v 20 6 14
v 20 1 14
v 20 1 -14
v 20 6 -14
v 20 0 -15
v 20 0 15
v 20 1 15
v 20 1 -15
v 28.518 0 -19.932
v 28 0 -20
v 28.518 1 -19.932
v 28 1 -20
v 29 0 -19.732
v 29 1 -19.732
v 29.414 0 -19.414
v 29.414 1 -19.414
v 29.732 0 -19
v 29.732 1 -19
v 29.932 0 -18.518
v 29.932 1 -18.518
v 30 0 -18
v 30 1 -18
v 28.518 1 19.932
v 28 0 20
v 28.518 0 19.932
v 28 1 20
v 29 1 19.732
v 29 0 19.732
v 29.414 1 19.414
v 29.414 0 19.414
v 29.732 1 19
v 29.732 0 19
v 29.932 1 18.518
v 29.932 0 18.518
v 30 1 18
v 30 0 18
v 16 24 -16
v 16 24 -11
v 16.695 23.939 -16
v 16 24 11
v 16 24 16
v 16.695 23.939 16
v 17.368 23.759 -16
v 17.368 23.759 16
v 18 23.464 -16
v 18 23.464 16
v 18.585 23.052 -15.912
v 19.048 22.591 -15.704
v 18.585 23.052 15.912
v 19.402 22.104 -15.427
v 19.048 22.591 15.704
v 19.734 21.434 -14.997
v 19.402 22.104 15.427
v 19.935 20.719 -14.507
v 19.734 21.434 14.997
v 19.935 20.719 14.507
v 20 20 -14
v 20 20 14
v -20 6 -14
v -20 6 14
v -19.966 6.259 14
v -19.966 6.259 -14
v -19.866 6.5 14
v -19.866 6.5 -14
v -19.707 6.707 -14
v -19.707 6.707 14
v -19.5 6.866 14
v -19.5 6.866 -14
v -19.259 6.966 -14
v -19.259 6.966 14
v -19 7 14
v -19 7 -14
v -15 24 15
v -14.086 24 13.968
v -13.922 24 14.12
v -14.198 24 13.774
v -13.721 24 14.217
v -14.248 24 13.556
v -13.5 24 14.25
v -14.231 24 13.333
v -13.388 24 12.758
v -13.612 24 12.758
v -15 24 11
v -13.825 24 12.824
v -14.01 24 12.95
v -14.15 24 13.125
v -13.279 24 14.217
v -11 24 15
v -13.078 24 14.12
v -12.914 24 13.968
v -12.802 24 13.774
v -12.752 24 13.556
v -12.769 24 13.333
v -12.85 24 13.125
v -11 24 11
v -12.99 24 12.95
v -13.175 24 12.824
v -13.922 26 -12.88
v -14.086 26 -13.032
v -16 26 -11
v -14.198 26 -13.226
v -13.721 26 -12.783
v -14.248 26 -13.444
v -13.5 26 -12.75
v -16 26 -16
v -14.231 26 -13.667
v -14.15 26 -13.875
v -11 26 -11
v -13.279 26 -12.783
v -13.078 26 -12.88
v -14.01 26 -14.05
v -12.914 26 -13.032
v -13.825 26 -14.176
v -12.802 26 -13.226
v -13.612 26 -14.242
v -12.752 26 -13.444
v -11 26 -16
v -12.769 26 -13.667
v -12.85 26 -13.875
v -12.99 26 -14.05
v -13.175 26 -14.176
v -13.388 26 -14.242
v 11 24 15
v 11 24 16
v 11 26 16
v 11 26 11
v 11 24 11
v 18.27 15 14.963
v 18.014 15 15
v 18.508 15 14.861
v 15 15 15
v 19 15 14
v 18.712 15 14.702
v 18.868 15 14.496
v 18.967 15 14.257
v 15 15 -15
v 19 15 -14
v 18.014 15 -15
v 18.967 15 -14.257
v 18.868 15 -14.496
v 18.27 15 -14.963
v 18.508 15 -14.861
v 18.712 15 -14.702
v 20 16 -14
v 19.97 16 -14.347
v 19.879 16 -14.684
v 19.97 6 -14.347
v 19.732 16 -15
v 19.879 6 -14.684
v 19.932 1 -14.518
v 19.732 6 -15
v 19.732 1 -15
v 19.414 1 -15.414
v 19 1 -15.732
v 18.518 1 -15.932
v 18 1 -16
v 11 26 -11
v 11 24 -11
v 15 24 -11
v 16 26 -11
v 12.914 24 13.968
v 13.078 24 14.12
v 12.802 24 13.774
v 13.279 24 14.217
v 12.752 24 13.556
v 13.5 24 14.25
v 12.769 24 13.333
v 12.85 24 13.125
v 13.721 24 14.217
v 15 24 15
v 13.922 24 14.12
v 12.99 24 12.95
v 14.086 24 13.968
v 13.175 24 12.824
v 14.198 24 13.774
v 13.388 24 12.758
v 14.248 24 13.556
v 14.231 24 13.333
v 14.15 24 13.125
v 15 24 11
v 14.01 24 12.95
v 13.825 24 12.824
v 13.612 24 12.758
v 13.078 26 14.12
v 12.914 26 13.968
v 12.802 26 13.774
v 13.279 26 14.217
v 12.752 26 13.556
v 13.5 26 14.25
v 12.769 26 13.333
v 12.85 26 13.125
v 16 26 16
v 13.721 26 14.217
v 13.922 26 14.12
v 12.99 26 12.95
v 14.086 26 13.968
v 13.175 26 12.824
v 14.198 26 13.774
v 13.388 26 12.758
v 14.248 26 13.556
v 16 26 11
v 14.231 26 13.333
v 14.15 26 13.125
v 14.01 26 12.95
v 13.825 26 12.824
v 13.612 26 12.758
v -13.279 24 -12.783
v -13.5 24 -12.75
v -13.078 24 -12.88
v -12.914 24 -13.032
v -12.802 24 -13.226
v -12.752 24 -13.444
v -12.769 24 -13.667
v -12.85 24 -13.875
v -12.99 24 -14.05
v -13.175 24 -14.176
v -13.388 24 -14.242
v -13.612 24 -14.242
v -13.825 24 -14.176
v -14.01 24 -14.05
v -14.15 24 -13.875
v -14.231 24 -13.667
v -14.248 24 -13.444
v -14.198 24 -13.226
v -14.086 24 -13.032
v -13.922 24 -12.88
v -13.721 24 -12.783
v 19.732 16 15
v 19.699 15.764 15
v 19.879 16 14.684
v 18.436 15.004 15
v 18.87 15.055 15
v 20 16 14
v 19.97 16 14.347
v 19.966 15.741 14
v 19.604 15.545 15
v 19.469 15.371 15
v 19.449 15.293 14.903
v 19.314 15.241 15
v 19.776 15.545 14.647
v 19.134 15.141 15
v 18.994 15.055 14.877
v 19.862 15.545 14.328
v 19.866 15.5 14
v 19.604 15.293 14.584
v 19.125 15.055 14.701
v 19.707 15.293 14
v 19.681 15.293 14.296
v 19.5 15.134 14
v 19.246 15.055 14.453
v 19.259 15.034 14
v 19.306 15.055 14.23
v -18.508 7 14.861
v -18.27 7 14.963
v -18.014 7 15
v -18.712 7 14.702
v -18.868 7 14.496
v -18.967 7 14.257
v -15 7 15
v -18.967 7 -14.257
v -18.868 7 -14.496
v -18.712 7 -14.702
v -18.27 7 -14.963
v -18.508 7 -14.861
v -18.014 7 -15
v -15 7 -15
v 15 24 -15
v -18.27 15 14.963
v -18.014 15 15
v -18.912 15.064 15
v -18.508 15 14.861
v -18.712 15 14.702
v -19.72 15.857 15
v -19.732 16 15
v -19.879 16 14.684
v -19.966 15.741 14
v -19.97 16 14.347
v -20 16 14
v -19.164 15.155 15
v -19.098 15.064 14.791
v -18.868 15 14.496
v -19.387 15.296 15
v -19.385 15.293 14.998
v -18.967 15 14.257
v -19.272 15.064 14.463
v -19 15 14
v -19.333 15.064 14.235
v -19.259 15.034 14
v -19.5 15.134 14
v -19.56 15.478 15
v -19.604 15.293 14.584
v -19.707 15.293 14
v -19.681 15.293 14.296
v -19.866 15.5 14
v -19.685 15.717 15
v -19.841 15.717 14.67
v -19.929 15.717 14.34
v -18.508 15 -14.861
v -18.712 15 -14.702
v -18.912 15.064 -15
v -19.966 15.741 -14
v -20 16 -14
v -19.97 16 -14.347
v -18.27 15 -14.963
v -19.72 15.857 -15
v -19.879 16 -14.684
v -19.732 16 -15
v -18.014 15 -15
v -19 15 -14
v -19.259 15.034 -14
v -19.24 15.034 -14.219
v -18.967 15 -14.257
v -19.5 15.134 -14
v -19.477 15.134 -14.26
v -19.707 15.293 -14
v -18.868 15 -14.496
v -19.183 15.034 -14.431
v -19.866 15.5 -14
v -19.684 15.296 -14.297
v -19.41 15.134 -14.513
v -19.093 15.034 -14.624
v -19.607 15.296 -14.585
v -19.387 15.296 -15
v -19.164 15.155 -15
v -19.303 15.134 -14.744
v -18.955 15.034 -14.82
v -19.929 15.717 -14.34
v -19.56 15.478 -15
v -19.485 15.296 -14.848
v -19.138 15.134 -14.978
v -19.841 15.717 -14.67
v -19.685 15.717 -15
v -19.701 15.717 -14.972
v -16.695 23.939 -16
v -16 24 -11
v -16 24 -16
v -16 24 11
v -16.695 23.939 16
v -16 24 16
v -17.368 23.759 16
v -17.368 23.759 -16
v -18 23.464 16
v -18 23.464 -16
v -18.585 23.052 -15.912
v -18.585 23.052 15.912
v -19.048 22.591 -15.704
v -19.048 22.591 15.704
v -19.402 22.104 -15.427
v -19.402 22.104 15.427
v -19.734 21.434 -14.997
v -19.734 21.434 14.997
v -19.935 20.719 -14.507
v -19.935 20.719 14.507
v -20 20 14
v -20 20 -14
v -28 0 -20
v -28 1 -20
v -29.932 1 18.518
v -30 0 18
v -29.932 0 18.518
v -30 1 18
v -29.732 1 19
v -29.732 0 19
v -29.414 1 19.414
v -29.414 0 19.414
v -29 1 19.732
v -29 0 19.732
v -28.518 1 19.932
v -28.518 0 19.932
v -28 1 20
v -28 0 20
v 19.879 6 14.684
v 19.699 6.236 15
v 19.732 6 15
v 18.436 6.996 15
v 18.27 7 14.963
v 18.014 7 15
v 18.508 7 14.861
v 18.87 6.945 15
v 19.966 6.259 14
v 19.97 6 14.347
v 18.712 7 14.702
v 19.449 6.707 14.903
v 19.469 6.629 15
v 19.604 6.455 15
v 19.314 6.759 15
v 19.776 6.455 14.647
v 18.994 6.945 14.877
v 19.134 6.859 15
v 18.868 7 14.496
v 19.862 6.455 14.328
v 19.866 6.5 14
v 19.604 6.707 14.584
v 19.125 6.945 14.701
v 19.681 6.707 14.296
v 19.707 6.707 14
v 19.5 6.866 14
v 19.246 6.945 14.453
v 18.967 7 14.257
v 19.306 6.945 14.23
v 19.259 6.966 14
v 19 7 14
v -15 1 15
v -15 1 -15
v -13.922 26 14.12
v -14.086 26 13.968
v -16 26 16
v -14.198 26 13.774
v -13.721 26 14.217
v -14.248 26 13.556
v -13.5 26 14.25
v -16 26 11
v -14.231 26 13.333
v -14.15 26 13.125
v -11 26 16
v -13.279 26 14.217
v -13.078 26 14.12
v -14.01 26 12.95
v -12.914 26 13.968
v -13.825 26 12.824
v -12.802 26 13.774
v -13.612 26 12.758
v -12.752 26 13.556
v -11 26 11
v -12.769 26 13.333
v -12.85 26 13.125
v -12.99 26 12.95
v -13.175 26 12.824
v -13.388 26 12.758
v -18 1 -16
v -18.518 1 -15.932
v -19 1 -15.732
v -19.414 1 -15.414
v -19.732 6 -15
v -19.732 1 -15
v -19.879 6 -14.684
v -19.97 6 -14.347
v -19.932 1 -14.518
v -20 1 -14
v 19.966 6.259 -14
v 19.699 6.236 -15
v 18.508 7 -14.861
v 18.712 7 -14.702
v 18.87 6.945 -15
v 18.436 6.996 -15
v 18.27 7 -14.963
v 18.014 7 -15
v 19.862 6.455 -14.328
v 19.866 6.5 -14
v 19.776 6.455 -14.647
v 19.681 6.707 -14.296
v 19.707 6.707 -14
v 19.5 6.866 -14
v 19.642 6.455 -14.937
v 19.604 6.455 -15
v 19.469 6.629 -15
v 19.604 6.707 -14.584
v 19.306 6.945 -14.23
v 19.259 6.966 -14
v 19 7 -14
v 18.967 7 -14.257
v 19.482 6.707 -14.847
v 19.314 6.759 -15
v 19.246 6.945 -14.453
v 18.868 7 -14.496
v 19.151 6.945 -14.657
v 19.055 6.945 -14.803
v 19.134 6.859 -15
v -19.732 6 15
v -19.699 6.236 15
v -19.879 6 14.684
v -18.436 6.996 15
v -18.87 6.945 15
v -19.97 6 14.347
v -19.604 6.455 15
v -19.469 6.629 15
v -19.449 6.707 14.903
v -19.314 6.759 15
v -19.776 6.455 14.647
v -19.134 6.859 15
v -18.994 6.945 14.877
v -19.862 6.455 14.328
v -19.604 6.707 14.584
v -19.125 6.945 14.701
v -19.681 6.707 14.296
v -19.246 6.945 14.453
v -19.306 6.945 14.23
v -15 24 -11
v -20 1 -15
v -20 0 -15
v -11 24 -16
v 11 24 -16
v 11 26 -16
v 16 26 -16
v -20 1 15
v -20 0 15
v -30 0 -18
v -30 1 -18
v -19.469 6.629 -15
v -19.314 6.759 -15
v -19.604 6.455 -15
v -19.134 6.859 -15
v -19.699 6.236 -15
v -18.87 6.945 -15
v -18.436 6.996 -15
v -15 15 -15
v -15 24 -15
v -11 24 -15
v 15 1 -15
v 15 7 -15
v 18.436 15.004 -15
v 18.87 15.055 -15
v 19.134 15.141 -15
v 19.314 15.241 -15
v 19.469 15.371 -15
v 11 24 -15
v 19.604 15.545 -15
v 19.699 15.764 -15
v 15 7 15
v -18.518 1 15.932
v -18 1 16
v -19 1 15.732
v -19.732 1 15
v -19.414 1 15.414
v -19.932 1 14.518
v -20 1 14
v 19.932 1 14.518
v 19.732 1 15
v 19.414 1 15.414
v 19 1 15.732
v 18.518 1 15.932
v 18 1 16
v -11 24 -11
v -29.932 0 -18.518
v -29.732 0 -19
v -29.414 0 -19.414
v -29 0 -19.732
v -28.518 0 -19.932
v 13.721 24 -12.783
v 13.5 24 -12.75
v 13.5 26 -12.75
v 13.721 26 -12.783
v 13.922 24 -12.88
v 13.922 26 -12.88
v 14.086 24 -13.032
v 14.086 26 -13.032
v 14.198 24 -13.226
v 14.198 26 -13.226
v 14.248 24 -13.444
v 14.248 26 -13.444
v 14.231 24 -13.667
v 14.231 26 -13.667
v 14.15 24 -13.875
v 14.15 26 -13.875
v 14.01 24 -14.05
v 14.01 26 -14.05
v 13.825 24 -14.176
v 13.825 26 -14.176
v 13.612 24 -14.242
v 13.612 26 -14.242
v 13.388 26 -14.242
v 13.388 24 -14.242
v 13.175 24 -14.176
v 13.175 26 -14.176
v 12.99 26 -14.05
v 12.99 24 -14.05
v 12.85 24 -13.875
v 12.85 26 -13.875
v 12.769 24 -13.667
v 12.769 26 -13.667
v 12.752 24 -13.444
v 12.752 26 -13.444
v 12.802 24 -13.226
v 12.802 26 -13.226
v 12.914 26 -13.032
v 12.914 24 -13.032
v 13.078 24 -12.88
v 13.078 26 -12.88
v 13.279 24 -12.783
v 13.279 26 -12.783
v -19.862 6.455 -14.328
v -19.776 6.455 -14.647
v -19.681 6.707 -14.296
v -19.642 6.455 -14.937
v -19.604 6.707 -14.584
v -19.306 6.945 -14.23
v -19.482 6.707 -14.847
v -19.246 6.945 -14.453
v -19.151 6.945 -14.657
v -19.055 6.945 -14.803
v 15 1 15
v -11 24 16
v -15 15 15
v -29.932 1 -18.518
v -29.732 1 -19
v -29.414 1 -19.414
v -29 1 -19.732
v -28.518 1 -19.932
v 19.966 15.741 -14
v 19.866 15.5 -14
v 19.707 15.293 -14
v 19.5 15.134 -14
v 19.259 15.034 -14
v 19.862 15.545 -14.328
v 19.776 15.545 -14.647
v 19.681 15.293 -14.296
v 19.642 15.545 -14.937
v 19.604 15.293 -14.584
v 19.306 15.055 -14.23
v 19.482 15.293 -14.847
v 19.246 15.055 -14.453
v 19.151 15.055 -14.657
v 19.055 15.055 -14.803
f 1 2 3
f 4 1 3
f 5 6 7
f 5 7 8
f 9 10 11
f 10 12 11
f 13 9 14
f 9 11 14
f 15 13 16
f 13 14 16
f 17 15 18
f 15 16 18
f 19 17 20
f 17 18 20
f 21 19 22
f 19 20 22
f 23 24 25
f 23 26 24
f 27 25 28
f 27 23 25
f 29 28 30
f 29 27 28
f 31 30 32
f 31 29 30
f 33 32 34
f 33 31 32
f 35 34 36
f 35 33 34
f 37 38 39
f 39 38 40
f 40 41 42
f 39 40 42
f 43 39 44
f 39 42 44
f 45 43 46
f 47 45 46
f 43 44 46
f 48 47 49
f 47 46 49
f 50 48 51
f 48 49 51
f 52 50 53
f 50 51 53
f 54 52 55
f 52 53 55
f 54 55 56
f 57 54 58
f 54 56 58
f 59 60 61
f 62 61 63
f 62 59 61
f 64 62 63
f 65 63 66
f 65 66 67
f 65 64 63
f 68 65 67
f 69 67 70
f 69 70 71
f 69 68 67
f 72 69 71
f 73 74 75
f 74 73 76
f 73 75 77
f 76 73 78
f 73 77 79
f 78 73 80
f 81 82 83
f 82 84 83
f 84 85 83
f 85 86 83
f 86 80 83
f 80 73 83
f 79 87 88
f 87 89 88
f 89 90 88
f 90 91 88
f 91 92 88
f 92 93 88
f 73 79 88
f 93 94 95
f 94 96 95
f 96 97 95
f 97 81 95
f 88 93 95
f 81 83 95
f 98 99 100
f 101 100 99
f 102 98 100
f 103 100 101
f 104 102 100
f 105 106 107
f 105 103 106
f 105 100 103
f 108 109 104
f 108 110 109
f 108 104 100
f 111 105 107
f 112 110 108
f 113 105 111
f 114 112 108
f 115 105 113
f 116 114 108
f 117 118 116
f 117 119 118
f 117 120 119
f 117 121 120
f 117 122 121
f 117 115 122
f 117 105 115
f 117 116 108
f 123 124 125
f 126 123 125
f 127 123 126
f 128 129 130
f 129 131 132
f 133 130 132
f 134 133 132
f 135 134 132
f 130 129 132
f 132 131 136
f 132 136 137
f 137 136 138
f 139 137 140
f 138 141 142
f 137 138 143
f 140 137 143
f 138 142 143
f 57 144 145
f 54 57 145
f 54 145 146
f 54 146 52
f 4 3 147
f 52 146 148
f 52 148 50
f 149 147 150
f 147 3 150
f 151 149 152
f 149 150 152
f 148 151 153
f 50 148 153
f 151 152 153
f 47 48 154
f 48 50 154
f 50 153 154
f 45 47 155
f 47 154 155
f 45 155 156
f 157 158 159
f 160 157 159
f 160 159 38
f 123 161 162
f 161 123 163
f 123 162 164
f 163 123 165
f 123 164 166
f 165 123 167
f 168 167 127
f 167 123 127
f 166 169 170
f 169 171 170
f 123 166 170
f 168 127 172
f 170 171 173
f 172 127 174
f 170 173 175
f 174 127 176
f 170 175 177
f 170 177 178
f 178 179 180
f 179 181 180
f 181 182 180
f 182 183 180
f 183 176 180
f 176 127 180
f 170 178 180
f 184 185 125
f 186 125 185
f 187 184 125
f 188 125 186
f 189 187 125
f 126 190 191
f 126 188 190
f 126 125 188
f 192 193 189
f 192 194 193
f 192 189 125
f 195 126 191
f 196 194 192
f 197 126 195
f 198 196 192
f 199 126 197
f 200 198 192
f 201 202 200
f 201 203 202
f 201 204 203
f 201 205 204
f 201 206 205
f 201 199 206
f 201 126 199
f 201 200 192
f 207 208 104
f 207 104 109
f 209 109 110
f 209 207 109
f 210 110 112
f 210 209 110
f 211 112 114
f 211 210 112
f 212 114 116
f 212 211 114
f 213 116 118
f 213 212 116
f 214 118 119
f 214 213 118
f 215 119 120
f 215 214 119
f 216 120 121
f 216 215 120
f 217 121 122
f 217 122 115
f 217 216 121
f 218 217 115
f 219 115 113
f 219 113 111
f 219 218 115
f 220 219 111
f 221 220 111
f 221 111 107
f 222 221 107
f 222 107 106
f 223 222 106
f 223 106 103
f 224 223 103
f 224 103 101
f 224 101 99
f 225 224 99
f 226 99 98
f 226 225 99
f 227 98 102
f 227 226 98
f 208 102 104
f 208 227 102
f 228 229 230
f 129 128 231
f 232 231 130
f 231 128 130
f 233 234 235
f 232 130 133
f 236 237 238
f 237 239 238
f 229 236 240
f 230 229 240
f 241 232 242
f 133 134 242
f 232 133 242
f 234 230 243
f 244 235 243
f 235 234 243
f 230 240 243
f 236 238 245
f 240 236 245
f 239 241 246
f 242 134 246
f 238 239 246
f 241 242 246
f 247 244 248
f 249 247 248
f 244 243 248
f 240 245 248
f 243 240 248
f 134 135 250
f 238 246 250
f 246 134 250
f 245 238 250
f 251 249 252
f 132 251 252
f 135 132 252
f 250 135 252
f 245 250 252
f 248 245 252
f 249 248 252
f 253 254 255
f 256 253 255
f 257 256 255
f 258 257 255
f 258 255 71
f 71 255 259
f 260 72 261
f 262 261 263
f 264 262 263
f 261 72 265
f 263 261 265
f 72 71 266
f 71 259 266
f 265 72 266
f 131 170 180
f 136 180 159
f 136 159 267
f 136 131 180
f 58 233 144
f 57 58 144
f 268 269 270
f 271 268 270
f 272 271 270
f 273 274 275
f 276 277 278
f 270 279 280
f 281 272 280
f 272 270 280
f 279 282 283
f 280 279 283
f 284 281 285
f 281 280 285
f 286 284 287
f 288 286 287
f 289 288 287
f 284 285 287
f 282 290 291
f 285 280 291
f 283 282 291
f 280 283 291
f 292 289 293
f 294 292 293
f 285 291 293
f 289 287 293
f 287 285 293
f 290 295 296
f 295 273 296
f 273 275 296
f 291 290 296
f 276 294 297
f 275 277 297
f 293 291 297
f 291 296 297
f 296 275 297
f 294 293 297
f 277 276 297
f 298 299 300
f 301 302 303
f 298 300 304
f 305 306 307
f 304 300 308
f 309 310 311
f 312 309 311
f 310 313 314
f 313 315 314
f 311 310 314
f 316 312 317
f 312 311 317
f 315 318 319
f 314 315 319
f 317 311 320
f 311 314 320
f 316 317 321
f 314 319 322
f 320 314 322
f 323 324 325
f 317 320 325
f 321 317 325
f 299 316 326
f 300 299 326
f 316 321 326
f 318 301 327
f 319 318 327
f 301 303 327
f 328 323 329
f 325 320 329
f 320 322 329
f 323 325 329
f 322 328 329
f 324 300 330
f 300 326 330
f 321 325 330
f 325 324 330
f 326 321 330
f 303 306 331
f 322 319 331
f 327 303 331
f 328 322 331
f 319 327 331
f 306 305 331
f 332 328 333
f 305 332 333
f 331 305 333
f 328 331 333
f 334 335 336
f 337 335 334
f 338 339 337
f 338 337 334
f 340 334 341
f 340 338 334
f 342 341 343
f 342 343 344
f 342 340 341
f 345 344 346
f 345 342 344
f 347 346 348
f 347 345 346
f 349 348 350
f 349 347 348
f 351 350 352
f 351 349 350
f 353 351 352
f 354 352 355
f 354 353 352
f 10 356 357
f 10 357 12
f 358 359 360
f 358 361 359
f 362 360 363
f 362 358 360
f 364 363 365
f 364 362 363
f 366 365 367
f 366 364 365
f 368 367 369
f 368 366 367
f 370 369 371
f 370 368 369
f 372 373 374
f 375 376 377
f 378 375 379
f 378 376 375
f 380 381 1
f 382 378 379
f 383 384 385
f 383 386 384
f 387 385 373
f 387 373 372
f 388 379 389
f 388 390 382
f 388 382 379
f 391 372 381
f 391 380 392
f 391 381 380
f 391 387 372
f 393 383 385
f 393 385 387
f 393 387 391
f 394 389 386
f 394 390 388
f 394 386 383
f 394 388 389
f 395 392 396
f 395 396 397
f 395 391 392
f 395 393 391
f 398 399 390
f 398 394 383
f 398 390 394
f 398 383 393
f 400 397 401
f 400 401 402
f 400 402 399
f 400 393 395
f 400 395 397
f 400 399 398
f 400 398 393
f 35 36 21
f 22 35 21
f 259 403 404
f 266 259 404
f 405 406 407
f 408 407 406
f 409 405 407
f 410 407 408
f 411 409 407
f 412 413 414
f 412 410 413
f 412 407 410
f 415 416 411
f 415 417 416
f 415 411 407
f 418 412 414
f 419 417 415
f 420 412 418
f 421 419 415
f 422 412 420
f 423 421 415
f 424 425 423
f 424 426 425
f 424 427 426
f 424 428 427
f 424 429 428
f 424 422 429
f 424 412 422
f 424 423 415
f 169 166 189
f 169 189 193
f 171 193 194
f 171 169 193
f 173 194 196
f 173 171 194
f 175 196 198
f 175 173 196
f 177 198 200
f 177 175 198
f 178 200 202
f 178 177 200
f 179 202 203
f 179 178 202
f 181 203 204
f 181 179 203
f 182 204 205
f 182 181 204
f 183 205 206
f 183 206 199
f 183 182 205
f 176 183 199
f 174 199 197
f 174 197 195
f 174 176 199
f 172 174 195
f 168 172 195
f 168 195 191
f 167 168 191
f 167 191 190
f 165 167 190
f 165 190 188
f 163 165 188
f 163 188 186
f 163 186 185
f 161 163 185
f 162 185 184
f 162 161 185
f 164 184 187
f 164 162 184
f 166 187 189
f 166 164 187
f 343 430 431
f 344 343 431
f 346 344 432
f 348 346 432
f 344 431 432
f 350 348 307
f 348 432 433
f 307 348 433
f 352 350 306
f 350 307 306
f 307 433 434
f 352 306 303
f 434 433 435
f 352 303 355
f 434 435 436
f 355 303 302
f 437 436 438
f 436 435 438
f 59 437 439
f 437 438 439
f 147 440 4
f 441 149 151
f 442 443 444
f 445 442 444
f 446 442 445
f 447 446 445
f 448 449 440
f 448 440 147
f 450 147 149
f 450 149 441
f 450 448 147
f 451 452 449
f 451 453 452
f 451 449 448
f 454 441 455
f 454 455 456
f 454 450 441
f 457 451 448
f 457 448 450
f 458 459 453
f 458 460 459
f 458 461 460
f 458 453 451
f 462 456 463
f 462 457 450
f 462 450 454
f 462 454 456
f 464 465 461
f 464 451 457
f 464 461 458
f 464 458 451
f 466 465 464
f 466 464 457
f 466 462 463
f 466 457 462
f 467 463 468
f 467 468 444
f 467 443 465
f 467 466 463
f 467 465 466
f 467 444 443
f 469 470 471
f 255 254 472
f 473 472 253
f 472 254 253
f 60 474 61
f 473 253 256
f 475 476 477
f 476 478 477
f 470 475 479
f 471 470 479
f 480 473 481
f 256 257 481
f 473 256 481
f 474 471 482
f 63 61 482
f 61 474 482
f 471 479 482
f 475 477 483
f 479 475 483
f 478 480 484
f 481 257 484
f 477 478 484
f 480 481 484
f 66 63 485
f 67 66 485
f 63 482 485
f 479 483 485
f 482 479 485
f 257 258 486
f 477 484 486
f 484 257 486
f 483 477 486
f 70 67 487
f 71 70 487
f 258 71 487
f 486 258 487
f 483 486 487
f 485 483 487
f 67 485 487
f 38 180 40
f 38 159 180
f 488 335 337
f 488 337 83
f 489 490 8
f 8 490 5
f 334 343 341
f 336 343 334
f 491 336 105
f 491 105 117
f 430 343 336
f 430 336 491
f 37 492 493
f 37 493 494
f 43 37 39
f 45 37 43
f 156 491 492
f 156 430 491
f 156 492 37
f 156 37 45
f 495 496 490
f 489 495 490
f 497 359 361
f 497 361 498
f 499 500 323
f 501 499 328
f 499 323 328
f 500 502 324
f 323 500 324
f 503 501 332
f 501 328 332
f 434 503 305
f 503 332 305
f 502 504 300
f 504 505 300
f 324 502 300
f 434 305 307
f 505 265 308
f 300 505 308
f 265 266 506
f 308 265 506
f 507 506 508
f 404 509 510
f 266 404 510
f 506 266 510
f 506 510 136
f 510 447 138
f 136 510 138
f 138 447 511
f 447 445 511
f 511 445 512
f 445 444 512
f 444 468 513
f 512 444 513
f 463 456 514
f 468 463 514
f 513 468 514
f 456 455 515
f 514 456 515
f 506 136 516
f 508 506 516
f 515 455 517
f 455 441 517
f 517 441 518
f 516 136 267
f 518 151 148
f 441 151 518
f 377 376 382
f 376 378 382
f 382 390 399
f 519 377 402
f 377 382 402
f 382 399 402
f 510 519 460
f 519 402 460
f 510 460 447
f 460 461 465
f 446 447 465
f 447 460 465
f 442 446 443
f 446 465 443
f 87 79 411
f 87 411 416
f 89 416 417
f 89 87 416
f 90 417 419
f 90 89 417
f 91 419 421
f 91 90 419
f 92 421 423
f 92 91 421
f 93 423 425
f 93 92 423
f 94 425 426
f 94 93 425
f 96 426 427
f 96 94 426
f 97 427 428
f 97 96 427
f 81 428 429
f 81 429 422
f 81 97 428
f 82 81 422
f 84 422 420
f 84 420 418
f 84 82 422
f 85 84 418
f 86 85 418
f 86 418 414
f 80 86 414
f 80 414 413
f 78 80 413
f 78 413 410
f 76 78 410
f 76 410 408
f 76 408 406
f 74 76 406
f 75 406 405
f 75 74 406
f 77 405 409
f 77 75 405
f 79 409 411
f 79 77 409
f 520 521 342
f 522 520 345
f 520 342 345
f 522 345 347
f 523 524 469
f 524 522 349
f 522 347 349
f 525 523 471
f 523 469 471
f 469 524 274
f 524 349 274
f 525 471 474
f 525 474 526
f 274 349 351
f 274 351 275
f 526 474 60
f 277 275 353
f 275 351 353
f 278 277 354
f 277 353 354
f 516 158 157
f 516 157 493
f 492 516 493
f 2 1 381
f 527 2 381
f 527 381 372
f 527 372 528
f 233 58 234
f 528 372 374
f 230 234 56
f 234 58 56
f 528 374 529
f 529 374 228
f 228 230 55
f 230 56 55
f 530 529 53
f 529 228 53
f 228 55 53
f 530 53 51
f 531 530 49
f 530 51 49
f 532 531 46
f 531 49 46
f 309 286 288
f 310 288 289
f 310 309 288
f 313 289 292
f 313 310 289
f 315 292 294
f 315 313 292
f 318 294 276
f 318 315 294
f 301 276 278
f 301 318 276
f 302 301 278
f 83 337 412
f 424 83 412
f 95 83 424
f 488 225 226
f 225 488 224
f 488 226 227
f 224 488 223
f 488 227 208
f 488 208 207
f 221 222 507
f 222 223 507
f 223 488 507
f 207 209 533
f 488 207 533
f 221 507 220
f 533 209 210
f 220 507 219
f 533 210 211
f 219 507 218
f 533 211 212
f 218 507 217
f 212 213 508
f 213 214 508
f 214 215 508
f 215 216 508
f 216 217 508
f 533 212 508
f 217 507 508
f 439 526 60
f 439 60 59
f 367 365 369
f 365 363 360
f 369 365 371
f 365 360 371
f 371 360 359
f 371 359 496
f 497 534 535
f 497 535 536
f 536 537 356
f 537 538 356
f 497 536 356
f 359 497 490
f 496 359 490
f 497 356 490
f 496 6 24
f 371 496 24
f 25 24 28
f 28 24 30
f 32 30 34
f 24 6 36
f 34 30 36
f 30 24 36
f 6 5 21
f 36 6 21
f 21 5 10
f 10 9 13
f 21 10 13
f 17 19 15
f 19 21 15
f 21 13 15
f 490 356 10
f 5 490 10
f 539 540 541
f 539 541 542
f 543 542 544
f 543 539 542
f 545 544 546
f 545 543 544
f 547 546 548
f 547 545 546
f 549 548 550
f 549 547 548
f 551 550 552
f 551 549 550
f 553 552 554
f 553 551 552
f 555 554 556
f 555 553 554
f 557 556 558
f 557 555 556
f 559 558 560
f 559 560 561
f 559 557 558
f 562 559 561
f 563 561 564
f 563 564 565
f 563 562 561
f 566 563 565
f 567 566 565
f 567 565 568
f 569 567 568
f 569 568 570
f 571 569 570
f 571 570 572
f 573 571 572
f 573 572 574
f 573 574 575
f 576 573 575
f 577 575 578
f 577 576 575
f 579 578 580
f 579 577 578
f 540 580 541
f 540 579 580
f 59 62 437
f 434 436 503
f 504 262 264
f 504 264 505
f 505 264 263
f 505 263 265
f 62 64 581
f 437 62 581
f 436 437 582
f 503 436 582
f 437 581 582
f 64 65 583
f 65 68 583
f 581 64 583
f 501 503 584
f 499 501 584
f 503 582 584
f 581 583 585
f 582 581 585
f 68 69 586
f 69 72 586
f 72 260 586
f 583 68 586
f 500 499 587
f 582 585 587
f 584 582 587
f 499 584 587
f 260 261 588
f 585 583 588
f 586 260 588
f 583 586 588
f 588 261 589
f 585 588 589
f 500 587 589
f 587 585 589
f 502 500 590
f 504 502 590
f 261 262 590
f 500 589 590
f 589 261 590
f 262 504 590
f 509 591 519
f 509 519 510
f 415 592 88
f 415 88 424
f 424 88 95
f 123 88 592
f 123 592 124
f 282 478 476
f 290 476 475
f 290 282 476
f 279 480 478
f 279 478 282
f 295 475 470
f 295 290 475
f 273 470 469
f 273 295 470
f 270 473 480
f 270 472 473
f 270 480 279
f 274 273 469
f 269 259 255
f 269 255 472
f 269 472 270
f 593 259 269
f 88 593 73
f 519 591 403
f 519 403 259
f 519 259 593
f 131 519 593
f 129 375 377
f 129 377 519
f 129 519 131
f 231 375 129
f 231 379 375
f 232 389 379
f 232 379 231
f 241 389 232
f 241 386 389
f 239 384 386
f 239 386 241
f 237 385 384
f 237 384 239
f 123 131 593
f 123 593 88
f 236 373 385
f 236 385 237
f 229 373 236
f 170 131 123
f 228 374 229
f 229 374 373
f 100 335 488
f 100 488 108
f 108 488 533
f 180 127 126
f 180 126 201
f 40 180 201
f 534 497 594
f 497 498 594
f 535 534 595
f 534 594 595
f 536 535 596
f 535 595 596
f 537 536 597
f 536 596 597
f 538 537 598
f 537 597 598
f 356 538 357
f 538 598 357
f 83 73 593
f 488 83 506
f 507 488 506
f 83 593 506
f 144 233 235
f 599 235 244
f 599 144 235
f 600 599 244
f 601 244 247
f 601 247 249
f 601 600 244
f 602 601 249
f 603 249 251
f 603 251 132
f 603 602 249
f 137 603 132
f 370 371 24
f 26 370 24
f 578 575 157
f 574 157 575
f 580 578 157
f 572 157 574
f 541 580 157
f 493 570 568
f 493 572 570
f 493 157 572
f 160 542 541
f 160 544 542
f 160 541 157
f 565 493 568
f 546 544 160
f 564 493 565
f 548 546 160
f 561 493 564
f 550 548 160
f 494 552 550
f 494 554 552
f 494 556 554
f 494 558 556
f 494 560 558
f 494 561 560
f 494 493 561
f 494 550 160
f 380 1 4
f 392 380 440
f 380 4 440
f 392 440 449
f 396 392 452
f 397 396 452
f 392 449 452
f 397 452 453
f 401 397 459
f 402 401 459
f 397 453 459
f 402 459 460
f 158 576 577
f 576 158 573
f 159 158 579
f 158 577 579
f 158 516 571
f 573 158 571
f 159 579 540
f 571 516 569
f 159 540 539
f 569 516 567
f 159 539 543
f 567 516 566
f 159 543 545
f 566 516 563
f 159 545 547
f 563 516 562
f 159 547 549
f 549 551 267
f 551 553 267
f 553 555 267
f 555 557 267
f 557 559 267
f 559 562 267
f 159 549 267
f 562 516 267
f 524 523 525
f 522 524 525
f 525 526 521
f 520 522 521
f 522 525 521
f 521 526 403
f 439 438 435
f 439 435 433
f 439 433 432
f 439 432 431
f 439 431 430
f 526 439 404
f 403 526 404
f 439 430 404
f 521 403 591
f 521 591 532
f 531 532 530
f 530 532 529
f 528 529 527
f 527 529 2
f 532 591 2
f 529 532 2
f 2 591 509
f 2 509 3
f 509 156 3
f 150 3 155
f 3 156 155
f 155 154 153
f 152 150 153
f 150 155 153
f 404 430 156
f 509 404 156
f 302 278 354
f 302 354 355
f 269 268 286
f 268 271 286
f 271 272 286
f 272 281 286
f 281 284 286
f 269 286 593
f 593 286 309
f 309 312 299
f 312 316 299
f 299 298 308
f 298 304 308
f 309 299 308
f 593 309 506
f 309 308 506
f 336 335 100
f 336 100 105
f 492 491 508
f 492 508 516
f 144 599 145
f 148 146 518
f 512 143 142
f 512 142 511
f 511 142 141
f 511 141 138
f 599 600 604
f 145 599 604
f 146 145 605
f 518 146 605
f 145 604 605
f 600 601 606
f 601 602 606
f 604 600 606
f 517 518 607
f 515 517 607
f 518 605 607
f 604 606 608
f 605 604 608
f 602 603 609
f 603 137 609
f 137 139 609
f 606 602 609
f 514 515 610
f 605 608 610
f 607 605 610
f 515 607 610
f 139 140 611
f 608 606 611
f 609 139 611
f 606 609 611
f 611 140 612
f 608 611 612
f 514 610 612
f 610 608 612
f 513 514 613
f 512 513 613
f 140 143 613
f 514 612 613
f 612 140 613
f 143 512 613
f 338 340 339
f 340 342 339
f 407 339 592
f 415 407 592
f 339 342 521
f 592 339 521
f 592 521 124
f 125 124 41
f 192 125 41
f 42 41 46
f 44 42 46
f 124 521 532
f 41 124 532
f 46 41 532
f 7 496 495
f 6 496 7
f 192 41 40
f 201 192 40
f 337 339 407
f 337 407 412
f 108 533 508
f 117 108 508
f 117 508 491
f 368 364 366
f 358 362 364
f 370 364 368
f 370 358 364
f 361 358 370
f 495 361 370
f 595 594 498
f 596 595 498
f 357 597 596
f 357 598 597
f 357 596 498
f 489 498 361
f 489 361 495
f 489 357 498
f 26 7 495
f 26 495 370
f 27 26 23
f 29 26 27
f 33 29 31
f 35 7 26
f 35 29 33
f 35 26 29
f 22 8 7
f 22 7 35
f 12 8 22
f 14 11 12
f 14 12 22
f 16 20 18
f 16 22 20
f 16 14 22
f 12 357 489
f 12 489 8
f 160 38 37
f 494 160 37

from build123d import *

# Parameters (mm, degrees)
SKETCH1_W           = 60
SKETCH1_H           = 40
SKETCH1_W_2         = 40
SKETCH1_H_2         = 30
BOSS_EXTRUDE1_DEPTH = 1
SKETCH2_W           = 30
SKETCH2_H           = 30
BOSS_EXTRUDE2_DEPTH = 14
SKETCH3_W           = 30
SKETCH3_H           = 8
CUT_EXTRUDE1_DEPTH  = 56.901699437
SKETCH4_W           = 40
SKETCH4_H           = 32
SKETCH4_W_2         = 30
SKETCH4_H_2         = 30
BOSS_EXTRUDE3_DEPTH = 9
FILLET1_R           = 2
FILLET2_R           = 2
FILLET4_R           = 1
CUT_EXTRUDE2_DEPTH  = 53.64978637
SKETCH7_W           = 5
SKETCH7_H           = 5
SKETCH7_R           = 0.75
BOSS_EXTRUDE5_DEPTH = 2


# Some blends are built 0.0001 mm under size
with BuildPart() as part:
    # Sketch1 → Boss-Extrude1 (new body)
    with BuildSketch(Plane(origin=(0, 0, 0), x_dir=(1, 0, 0), z_dir=(0, 1, 0))):
        Rectangle(SKETCH1_W, SKETCH1_H)
        Rectangle(SKETCH1_W_2, SKETCH1_H_2, mode=Mode.SUBTRACT)
    extrude(amount=BOSS_EXTRUDE1_DEPTH)

    # Fillet1
    fillet1_edges = [part.edges().sort_by_distance(p)[0] for p in [
        (-30, 0.5, -20),
        (30, 0.5, -20),
        (30, 0.5, 20),
        (-30, 0.5, 20),
    ]]
    fillet(fillet1_edges, radius=FILLET1_R)


with BuildPart() as body_2:
    # Sketch2 → Boss-Extrude2 (new body)
    with BuildSketch(Plane(origin=(0, 1, 0), x_dir=(1, 0, 0), z_dir=(0, 1, 0))):
        Polygon((20, -15), (20, 15), (20, 16), (-20, 16), (-20, 15), (-20, -15), (-20, -16), (20, -16), align=None)
        Rectangle(SKETCH2_W, SKETCH2_H, mode=Mode.SUBTRACT)
    extrude(amount=BOSS_EXTRUDE2_DEPTH)

    # Sketch3 → Cut-Extrude1 (cut, through all)
    with BuildSketch(Plane(origin=(20, 0, 0), x_dir=(0, 0, -1), z_dir=(1, 0, 0))):
        with Locations((0, 11)):
            Rectangle(SKETCH3_W, SKETCH3_H)
    extrude(amount=-CUT_EXTRUDE1_DEPTH, mode=Mode.SUBTRACT)

    # Sketch4 → Boss-Extrude3 (add)
    with BuildSketch(Plane(origin=(0, 15, 0), x_dir=(1, 0, 0), z_dir=(0, 1, 0))):
        Rectangle(SKETCH4_W, SKETCH4_H)
        Rectangle(SKETCH4_W_2, SKETCH4_H_2, mode=Mode.SUBTRACT)
    extrude(amount=BOSS_EXTRUDE3_DEPTH)

    # Fillet2
    # the kernel refuses this fillet: 2 mm, written as the material it takes off along each edge
    with BuildSketch(Plane(origin=(20, -4, -16), x_dir=(0, 0, 1), z_dir=(0, 1, 0)), Plane(origin=(20, 29, 16), x_dir=(0, 0, -1), z_dir=(0, -1, 0))) as fillet2_piece_1:
        with BuildLine():
            CenterArc((FILLET2_R, -FILLET2_R), FILLET2_R, 90, 90)
            Line((0, -FILLET2_R), (0, 0))
            Line((0, 0), (FILLET2_R, 0))
        make_face()
    extrude(amount=33, mode=Mode.SUBTRACT)
    with BuildSketch(Plane(origin=(-20, -4, -16), x_dir=(0, 0, 1), z_dir=(0, 1, 0)), Plane(origin=(-20, 29, 16), x_dir=(0, 0, -1), z_dir=(0, -1, 0))) as fillet2_piece_2:
        with BuildLine():
            CenterArc((FILLET2_R, FILLET2_R), FILLET2_R, 180, 90)
            Line((0, FILLET2_R), (0, 0))
            Line((0, 0), (FILLET2_R, 0))
        make_face()
    extrude(amount=33, mode=Mode.SUBTRACT)

    # Fillet4
    fillet4_edges = [body_2.edges().sort_by_distance(p)[0] for p in [
        (20, 15, 0),
        (20, 7, 0),
        (19.931851653, 7, 14.51763809),
        (19.931851653, 7, -14.51763809),
        (19.931851653, 15, 14.51763809),
        (19.931851653, 15, -14.51763809),
        (-20, 15, 0),
        (-20, 7, 0),
        (-19.931851653, 15, 14.51763809),
        (-19.931851653, 15, -14.51763809),
        (-19.931851653, 7, 14.51763809),
        (-19.931851653, 7, -14.51763809),
    ]]
    fillet(fillet4_edges, radius=FILLET4_R - 0.0001)  # a hair under: the kernel refuses the full size

    # Sketch5 → Cut-Extrude2 (cut, through all)
    with BuildSketch(Plane.XY.offset(16)):
        with BuildLine():
            Line((-20, 20), (-20, 24))
            Line((-20, 24), (-16, 24))
            ThreePointArc((-16, 24), (-18.828427125, 22.828427125), (-20, 20))
        make_face()
        with BuildLine():
            Line((20, 20), (20, 24))
            Line((20, 24), (16, 24))
            ThreePointArc((16, 24), (18.828427125, 22.828427125), (20, 20))
        make_face()
    extrude(amount=-CUT_EXTRUDE2_DEPTH, mode=Mode.SUBTRACT)

    # Sketch7 → Boss-Extrude5 (add)
    # profile 1 of 4: a face of its own
    with BuildSketch(Plane(origin=(0, 24, 0), x_dir=(1, 0, 0), z_dir=(0, 1, 0))):
        with Locations((-13.5, 13.5)):
            Rectangle(SKETCH7_W, SKETCH7_H)
        with Locations(Location((-13.5, 13.5, 0), (0, 0, 270))):
            Circle(SKETCH7_R, mode=Mode.SUBTRACT)
    # profile 2 of 4: a face of its own
    with BuildSketch(Plane(origin=(0, 24, 0), x_dir=(1, 0, 0), z_dir=(0, 1, 0))):
        with Locations((13.5, 13.5)):
            Rectangle(SKETCH7_W, SKETCH7_H)
        with Locations(Location((13.5, 13.5, 0), (0, 0, 270))):
            Circle(SKETCH7_R, mode=Mode.SUBTRACT)
    # profile 3 of 4: a face of its own
    with BuildSketch(Plane(origin=(0, 24, 0), x_dir=(1, 0, 0), z_dir=(0, 1, 0))):
        with Locations((13.5, -13.5)):
            Rectangle(SKETCH7_W, SKETCH7_H)
        with Locations(Location((13.5, -13.5, 0), (0, 0, 270))):
            Circle(SKETCH7_R, mode=Mode.SUBTRACT)
    # profile 4 of 4: a face of its own
    with BuildSketch(Plane(origin=(0, 24, 0), x_dir=(1, 0, 0), z_dir=(0, 1, 0))):
        with Locations((-13.5, -13.5)):
            Rectangle(SKETCH7_W, SKETCH7_H)
        with Locations(Location((-13.5, -13.5, 0), (0, 0, 270))):
            Circle(SKETCH7_R, mode=Mode.SUBTRACT)
    extrude(amount=BOSS_EXTRUDE5_DEPTH)


solid = Compound([part.part, body_2.part])
